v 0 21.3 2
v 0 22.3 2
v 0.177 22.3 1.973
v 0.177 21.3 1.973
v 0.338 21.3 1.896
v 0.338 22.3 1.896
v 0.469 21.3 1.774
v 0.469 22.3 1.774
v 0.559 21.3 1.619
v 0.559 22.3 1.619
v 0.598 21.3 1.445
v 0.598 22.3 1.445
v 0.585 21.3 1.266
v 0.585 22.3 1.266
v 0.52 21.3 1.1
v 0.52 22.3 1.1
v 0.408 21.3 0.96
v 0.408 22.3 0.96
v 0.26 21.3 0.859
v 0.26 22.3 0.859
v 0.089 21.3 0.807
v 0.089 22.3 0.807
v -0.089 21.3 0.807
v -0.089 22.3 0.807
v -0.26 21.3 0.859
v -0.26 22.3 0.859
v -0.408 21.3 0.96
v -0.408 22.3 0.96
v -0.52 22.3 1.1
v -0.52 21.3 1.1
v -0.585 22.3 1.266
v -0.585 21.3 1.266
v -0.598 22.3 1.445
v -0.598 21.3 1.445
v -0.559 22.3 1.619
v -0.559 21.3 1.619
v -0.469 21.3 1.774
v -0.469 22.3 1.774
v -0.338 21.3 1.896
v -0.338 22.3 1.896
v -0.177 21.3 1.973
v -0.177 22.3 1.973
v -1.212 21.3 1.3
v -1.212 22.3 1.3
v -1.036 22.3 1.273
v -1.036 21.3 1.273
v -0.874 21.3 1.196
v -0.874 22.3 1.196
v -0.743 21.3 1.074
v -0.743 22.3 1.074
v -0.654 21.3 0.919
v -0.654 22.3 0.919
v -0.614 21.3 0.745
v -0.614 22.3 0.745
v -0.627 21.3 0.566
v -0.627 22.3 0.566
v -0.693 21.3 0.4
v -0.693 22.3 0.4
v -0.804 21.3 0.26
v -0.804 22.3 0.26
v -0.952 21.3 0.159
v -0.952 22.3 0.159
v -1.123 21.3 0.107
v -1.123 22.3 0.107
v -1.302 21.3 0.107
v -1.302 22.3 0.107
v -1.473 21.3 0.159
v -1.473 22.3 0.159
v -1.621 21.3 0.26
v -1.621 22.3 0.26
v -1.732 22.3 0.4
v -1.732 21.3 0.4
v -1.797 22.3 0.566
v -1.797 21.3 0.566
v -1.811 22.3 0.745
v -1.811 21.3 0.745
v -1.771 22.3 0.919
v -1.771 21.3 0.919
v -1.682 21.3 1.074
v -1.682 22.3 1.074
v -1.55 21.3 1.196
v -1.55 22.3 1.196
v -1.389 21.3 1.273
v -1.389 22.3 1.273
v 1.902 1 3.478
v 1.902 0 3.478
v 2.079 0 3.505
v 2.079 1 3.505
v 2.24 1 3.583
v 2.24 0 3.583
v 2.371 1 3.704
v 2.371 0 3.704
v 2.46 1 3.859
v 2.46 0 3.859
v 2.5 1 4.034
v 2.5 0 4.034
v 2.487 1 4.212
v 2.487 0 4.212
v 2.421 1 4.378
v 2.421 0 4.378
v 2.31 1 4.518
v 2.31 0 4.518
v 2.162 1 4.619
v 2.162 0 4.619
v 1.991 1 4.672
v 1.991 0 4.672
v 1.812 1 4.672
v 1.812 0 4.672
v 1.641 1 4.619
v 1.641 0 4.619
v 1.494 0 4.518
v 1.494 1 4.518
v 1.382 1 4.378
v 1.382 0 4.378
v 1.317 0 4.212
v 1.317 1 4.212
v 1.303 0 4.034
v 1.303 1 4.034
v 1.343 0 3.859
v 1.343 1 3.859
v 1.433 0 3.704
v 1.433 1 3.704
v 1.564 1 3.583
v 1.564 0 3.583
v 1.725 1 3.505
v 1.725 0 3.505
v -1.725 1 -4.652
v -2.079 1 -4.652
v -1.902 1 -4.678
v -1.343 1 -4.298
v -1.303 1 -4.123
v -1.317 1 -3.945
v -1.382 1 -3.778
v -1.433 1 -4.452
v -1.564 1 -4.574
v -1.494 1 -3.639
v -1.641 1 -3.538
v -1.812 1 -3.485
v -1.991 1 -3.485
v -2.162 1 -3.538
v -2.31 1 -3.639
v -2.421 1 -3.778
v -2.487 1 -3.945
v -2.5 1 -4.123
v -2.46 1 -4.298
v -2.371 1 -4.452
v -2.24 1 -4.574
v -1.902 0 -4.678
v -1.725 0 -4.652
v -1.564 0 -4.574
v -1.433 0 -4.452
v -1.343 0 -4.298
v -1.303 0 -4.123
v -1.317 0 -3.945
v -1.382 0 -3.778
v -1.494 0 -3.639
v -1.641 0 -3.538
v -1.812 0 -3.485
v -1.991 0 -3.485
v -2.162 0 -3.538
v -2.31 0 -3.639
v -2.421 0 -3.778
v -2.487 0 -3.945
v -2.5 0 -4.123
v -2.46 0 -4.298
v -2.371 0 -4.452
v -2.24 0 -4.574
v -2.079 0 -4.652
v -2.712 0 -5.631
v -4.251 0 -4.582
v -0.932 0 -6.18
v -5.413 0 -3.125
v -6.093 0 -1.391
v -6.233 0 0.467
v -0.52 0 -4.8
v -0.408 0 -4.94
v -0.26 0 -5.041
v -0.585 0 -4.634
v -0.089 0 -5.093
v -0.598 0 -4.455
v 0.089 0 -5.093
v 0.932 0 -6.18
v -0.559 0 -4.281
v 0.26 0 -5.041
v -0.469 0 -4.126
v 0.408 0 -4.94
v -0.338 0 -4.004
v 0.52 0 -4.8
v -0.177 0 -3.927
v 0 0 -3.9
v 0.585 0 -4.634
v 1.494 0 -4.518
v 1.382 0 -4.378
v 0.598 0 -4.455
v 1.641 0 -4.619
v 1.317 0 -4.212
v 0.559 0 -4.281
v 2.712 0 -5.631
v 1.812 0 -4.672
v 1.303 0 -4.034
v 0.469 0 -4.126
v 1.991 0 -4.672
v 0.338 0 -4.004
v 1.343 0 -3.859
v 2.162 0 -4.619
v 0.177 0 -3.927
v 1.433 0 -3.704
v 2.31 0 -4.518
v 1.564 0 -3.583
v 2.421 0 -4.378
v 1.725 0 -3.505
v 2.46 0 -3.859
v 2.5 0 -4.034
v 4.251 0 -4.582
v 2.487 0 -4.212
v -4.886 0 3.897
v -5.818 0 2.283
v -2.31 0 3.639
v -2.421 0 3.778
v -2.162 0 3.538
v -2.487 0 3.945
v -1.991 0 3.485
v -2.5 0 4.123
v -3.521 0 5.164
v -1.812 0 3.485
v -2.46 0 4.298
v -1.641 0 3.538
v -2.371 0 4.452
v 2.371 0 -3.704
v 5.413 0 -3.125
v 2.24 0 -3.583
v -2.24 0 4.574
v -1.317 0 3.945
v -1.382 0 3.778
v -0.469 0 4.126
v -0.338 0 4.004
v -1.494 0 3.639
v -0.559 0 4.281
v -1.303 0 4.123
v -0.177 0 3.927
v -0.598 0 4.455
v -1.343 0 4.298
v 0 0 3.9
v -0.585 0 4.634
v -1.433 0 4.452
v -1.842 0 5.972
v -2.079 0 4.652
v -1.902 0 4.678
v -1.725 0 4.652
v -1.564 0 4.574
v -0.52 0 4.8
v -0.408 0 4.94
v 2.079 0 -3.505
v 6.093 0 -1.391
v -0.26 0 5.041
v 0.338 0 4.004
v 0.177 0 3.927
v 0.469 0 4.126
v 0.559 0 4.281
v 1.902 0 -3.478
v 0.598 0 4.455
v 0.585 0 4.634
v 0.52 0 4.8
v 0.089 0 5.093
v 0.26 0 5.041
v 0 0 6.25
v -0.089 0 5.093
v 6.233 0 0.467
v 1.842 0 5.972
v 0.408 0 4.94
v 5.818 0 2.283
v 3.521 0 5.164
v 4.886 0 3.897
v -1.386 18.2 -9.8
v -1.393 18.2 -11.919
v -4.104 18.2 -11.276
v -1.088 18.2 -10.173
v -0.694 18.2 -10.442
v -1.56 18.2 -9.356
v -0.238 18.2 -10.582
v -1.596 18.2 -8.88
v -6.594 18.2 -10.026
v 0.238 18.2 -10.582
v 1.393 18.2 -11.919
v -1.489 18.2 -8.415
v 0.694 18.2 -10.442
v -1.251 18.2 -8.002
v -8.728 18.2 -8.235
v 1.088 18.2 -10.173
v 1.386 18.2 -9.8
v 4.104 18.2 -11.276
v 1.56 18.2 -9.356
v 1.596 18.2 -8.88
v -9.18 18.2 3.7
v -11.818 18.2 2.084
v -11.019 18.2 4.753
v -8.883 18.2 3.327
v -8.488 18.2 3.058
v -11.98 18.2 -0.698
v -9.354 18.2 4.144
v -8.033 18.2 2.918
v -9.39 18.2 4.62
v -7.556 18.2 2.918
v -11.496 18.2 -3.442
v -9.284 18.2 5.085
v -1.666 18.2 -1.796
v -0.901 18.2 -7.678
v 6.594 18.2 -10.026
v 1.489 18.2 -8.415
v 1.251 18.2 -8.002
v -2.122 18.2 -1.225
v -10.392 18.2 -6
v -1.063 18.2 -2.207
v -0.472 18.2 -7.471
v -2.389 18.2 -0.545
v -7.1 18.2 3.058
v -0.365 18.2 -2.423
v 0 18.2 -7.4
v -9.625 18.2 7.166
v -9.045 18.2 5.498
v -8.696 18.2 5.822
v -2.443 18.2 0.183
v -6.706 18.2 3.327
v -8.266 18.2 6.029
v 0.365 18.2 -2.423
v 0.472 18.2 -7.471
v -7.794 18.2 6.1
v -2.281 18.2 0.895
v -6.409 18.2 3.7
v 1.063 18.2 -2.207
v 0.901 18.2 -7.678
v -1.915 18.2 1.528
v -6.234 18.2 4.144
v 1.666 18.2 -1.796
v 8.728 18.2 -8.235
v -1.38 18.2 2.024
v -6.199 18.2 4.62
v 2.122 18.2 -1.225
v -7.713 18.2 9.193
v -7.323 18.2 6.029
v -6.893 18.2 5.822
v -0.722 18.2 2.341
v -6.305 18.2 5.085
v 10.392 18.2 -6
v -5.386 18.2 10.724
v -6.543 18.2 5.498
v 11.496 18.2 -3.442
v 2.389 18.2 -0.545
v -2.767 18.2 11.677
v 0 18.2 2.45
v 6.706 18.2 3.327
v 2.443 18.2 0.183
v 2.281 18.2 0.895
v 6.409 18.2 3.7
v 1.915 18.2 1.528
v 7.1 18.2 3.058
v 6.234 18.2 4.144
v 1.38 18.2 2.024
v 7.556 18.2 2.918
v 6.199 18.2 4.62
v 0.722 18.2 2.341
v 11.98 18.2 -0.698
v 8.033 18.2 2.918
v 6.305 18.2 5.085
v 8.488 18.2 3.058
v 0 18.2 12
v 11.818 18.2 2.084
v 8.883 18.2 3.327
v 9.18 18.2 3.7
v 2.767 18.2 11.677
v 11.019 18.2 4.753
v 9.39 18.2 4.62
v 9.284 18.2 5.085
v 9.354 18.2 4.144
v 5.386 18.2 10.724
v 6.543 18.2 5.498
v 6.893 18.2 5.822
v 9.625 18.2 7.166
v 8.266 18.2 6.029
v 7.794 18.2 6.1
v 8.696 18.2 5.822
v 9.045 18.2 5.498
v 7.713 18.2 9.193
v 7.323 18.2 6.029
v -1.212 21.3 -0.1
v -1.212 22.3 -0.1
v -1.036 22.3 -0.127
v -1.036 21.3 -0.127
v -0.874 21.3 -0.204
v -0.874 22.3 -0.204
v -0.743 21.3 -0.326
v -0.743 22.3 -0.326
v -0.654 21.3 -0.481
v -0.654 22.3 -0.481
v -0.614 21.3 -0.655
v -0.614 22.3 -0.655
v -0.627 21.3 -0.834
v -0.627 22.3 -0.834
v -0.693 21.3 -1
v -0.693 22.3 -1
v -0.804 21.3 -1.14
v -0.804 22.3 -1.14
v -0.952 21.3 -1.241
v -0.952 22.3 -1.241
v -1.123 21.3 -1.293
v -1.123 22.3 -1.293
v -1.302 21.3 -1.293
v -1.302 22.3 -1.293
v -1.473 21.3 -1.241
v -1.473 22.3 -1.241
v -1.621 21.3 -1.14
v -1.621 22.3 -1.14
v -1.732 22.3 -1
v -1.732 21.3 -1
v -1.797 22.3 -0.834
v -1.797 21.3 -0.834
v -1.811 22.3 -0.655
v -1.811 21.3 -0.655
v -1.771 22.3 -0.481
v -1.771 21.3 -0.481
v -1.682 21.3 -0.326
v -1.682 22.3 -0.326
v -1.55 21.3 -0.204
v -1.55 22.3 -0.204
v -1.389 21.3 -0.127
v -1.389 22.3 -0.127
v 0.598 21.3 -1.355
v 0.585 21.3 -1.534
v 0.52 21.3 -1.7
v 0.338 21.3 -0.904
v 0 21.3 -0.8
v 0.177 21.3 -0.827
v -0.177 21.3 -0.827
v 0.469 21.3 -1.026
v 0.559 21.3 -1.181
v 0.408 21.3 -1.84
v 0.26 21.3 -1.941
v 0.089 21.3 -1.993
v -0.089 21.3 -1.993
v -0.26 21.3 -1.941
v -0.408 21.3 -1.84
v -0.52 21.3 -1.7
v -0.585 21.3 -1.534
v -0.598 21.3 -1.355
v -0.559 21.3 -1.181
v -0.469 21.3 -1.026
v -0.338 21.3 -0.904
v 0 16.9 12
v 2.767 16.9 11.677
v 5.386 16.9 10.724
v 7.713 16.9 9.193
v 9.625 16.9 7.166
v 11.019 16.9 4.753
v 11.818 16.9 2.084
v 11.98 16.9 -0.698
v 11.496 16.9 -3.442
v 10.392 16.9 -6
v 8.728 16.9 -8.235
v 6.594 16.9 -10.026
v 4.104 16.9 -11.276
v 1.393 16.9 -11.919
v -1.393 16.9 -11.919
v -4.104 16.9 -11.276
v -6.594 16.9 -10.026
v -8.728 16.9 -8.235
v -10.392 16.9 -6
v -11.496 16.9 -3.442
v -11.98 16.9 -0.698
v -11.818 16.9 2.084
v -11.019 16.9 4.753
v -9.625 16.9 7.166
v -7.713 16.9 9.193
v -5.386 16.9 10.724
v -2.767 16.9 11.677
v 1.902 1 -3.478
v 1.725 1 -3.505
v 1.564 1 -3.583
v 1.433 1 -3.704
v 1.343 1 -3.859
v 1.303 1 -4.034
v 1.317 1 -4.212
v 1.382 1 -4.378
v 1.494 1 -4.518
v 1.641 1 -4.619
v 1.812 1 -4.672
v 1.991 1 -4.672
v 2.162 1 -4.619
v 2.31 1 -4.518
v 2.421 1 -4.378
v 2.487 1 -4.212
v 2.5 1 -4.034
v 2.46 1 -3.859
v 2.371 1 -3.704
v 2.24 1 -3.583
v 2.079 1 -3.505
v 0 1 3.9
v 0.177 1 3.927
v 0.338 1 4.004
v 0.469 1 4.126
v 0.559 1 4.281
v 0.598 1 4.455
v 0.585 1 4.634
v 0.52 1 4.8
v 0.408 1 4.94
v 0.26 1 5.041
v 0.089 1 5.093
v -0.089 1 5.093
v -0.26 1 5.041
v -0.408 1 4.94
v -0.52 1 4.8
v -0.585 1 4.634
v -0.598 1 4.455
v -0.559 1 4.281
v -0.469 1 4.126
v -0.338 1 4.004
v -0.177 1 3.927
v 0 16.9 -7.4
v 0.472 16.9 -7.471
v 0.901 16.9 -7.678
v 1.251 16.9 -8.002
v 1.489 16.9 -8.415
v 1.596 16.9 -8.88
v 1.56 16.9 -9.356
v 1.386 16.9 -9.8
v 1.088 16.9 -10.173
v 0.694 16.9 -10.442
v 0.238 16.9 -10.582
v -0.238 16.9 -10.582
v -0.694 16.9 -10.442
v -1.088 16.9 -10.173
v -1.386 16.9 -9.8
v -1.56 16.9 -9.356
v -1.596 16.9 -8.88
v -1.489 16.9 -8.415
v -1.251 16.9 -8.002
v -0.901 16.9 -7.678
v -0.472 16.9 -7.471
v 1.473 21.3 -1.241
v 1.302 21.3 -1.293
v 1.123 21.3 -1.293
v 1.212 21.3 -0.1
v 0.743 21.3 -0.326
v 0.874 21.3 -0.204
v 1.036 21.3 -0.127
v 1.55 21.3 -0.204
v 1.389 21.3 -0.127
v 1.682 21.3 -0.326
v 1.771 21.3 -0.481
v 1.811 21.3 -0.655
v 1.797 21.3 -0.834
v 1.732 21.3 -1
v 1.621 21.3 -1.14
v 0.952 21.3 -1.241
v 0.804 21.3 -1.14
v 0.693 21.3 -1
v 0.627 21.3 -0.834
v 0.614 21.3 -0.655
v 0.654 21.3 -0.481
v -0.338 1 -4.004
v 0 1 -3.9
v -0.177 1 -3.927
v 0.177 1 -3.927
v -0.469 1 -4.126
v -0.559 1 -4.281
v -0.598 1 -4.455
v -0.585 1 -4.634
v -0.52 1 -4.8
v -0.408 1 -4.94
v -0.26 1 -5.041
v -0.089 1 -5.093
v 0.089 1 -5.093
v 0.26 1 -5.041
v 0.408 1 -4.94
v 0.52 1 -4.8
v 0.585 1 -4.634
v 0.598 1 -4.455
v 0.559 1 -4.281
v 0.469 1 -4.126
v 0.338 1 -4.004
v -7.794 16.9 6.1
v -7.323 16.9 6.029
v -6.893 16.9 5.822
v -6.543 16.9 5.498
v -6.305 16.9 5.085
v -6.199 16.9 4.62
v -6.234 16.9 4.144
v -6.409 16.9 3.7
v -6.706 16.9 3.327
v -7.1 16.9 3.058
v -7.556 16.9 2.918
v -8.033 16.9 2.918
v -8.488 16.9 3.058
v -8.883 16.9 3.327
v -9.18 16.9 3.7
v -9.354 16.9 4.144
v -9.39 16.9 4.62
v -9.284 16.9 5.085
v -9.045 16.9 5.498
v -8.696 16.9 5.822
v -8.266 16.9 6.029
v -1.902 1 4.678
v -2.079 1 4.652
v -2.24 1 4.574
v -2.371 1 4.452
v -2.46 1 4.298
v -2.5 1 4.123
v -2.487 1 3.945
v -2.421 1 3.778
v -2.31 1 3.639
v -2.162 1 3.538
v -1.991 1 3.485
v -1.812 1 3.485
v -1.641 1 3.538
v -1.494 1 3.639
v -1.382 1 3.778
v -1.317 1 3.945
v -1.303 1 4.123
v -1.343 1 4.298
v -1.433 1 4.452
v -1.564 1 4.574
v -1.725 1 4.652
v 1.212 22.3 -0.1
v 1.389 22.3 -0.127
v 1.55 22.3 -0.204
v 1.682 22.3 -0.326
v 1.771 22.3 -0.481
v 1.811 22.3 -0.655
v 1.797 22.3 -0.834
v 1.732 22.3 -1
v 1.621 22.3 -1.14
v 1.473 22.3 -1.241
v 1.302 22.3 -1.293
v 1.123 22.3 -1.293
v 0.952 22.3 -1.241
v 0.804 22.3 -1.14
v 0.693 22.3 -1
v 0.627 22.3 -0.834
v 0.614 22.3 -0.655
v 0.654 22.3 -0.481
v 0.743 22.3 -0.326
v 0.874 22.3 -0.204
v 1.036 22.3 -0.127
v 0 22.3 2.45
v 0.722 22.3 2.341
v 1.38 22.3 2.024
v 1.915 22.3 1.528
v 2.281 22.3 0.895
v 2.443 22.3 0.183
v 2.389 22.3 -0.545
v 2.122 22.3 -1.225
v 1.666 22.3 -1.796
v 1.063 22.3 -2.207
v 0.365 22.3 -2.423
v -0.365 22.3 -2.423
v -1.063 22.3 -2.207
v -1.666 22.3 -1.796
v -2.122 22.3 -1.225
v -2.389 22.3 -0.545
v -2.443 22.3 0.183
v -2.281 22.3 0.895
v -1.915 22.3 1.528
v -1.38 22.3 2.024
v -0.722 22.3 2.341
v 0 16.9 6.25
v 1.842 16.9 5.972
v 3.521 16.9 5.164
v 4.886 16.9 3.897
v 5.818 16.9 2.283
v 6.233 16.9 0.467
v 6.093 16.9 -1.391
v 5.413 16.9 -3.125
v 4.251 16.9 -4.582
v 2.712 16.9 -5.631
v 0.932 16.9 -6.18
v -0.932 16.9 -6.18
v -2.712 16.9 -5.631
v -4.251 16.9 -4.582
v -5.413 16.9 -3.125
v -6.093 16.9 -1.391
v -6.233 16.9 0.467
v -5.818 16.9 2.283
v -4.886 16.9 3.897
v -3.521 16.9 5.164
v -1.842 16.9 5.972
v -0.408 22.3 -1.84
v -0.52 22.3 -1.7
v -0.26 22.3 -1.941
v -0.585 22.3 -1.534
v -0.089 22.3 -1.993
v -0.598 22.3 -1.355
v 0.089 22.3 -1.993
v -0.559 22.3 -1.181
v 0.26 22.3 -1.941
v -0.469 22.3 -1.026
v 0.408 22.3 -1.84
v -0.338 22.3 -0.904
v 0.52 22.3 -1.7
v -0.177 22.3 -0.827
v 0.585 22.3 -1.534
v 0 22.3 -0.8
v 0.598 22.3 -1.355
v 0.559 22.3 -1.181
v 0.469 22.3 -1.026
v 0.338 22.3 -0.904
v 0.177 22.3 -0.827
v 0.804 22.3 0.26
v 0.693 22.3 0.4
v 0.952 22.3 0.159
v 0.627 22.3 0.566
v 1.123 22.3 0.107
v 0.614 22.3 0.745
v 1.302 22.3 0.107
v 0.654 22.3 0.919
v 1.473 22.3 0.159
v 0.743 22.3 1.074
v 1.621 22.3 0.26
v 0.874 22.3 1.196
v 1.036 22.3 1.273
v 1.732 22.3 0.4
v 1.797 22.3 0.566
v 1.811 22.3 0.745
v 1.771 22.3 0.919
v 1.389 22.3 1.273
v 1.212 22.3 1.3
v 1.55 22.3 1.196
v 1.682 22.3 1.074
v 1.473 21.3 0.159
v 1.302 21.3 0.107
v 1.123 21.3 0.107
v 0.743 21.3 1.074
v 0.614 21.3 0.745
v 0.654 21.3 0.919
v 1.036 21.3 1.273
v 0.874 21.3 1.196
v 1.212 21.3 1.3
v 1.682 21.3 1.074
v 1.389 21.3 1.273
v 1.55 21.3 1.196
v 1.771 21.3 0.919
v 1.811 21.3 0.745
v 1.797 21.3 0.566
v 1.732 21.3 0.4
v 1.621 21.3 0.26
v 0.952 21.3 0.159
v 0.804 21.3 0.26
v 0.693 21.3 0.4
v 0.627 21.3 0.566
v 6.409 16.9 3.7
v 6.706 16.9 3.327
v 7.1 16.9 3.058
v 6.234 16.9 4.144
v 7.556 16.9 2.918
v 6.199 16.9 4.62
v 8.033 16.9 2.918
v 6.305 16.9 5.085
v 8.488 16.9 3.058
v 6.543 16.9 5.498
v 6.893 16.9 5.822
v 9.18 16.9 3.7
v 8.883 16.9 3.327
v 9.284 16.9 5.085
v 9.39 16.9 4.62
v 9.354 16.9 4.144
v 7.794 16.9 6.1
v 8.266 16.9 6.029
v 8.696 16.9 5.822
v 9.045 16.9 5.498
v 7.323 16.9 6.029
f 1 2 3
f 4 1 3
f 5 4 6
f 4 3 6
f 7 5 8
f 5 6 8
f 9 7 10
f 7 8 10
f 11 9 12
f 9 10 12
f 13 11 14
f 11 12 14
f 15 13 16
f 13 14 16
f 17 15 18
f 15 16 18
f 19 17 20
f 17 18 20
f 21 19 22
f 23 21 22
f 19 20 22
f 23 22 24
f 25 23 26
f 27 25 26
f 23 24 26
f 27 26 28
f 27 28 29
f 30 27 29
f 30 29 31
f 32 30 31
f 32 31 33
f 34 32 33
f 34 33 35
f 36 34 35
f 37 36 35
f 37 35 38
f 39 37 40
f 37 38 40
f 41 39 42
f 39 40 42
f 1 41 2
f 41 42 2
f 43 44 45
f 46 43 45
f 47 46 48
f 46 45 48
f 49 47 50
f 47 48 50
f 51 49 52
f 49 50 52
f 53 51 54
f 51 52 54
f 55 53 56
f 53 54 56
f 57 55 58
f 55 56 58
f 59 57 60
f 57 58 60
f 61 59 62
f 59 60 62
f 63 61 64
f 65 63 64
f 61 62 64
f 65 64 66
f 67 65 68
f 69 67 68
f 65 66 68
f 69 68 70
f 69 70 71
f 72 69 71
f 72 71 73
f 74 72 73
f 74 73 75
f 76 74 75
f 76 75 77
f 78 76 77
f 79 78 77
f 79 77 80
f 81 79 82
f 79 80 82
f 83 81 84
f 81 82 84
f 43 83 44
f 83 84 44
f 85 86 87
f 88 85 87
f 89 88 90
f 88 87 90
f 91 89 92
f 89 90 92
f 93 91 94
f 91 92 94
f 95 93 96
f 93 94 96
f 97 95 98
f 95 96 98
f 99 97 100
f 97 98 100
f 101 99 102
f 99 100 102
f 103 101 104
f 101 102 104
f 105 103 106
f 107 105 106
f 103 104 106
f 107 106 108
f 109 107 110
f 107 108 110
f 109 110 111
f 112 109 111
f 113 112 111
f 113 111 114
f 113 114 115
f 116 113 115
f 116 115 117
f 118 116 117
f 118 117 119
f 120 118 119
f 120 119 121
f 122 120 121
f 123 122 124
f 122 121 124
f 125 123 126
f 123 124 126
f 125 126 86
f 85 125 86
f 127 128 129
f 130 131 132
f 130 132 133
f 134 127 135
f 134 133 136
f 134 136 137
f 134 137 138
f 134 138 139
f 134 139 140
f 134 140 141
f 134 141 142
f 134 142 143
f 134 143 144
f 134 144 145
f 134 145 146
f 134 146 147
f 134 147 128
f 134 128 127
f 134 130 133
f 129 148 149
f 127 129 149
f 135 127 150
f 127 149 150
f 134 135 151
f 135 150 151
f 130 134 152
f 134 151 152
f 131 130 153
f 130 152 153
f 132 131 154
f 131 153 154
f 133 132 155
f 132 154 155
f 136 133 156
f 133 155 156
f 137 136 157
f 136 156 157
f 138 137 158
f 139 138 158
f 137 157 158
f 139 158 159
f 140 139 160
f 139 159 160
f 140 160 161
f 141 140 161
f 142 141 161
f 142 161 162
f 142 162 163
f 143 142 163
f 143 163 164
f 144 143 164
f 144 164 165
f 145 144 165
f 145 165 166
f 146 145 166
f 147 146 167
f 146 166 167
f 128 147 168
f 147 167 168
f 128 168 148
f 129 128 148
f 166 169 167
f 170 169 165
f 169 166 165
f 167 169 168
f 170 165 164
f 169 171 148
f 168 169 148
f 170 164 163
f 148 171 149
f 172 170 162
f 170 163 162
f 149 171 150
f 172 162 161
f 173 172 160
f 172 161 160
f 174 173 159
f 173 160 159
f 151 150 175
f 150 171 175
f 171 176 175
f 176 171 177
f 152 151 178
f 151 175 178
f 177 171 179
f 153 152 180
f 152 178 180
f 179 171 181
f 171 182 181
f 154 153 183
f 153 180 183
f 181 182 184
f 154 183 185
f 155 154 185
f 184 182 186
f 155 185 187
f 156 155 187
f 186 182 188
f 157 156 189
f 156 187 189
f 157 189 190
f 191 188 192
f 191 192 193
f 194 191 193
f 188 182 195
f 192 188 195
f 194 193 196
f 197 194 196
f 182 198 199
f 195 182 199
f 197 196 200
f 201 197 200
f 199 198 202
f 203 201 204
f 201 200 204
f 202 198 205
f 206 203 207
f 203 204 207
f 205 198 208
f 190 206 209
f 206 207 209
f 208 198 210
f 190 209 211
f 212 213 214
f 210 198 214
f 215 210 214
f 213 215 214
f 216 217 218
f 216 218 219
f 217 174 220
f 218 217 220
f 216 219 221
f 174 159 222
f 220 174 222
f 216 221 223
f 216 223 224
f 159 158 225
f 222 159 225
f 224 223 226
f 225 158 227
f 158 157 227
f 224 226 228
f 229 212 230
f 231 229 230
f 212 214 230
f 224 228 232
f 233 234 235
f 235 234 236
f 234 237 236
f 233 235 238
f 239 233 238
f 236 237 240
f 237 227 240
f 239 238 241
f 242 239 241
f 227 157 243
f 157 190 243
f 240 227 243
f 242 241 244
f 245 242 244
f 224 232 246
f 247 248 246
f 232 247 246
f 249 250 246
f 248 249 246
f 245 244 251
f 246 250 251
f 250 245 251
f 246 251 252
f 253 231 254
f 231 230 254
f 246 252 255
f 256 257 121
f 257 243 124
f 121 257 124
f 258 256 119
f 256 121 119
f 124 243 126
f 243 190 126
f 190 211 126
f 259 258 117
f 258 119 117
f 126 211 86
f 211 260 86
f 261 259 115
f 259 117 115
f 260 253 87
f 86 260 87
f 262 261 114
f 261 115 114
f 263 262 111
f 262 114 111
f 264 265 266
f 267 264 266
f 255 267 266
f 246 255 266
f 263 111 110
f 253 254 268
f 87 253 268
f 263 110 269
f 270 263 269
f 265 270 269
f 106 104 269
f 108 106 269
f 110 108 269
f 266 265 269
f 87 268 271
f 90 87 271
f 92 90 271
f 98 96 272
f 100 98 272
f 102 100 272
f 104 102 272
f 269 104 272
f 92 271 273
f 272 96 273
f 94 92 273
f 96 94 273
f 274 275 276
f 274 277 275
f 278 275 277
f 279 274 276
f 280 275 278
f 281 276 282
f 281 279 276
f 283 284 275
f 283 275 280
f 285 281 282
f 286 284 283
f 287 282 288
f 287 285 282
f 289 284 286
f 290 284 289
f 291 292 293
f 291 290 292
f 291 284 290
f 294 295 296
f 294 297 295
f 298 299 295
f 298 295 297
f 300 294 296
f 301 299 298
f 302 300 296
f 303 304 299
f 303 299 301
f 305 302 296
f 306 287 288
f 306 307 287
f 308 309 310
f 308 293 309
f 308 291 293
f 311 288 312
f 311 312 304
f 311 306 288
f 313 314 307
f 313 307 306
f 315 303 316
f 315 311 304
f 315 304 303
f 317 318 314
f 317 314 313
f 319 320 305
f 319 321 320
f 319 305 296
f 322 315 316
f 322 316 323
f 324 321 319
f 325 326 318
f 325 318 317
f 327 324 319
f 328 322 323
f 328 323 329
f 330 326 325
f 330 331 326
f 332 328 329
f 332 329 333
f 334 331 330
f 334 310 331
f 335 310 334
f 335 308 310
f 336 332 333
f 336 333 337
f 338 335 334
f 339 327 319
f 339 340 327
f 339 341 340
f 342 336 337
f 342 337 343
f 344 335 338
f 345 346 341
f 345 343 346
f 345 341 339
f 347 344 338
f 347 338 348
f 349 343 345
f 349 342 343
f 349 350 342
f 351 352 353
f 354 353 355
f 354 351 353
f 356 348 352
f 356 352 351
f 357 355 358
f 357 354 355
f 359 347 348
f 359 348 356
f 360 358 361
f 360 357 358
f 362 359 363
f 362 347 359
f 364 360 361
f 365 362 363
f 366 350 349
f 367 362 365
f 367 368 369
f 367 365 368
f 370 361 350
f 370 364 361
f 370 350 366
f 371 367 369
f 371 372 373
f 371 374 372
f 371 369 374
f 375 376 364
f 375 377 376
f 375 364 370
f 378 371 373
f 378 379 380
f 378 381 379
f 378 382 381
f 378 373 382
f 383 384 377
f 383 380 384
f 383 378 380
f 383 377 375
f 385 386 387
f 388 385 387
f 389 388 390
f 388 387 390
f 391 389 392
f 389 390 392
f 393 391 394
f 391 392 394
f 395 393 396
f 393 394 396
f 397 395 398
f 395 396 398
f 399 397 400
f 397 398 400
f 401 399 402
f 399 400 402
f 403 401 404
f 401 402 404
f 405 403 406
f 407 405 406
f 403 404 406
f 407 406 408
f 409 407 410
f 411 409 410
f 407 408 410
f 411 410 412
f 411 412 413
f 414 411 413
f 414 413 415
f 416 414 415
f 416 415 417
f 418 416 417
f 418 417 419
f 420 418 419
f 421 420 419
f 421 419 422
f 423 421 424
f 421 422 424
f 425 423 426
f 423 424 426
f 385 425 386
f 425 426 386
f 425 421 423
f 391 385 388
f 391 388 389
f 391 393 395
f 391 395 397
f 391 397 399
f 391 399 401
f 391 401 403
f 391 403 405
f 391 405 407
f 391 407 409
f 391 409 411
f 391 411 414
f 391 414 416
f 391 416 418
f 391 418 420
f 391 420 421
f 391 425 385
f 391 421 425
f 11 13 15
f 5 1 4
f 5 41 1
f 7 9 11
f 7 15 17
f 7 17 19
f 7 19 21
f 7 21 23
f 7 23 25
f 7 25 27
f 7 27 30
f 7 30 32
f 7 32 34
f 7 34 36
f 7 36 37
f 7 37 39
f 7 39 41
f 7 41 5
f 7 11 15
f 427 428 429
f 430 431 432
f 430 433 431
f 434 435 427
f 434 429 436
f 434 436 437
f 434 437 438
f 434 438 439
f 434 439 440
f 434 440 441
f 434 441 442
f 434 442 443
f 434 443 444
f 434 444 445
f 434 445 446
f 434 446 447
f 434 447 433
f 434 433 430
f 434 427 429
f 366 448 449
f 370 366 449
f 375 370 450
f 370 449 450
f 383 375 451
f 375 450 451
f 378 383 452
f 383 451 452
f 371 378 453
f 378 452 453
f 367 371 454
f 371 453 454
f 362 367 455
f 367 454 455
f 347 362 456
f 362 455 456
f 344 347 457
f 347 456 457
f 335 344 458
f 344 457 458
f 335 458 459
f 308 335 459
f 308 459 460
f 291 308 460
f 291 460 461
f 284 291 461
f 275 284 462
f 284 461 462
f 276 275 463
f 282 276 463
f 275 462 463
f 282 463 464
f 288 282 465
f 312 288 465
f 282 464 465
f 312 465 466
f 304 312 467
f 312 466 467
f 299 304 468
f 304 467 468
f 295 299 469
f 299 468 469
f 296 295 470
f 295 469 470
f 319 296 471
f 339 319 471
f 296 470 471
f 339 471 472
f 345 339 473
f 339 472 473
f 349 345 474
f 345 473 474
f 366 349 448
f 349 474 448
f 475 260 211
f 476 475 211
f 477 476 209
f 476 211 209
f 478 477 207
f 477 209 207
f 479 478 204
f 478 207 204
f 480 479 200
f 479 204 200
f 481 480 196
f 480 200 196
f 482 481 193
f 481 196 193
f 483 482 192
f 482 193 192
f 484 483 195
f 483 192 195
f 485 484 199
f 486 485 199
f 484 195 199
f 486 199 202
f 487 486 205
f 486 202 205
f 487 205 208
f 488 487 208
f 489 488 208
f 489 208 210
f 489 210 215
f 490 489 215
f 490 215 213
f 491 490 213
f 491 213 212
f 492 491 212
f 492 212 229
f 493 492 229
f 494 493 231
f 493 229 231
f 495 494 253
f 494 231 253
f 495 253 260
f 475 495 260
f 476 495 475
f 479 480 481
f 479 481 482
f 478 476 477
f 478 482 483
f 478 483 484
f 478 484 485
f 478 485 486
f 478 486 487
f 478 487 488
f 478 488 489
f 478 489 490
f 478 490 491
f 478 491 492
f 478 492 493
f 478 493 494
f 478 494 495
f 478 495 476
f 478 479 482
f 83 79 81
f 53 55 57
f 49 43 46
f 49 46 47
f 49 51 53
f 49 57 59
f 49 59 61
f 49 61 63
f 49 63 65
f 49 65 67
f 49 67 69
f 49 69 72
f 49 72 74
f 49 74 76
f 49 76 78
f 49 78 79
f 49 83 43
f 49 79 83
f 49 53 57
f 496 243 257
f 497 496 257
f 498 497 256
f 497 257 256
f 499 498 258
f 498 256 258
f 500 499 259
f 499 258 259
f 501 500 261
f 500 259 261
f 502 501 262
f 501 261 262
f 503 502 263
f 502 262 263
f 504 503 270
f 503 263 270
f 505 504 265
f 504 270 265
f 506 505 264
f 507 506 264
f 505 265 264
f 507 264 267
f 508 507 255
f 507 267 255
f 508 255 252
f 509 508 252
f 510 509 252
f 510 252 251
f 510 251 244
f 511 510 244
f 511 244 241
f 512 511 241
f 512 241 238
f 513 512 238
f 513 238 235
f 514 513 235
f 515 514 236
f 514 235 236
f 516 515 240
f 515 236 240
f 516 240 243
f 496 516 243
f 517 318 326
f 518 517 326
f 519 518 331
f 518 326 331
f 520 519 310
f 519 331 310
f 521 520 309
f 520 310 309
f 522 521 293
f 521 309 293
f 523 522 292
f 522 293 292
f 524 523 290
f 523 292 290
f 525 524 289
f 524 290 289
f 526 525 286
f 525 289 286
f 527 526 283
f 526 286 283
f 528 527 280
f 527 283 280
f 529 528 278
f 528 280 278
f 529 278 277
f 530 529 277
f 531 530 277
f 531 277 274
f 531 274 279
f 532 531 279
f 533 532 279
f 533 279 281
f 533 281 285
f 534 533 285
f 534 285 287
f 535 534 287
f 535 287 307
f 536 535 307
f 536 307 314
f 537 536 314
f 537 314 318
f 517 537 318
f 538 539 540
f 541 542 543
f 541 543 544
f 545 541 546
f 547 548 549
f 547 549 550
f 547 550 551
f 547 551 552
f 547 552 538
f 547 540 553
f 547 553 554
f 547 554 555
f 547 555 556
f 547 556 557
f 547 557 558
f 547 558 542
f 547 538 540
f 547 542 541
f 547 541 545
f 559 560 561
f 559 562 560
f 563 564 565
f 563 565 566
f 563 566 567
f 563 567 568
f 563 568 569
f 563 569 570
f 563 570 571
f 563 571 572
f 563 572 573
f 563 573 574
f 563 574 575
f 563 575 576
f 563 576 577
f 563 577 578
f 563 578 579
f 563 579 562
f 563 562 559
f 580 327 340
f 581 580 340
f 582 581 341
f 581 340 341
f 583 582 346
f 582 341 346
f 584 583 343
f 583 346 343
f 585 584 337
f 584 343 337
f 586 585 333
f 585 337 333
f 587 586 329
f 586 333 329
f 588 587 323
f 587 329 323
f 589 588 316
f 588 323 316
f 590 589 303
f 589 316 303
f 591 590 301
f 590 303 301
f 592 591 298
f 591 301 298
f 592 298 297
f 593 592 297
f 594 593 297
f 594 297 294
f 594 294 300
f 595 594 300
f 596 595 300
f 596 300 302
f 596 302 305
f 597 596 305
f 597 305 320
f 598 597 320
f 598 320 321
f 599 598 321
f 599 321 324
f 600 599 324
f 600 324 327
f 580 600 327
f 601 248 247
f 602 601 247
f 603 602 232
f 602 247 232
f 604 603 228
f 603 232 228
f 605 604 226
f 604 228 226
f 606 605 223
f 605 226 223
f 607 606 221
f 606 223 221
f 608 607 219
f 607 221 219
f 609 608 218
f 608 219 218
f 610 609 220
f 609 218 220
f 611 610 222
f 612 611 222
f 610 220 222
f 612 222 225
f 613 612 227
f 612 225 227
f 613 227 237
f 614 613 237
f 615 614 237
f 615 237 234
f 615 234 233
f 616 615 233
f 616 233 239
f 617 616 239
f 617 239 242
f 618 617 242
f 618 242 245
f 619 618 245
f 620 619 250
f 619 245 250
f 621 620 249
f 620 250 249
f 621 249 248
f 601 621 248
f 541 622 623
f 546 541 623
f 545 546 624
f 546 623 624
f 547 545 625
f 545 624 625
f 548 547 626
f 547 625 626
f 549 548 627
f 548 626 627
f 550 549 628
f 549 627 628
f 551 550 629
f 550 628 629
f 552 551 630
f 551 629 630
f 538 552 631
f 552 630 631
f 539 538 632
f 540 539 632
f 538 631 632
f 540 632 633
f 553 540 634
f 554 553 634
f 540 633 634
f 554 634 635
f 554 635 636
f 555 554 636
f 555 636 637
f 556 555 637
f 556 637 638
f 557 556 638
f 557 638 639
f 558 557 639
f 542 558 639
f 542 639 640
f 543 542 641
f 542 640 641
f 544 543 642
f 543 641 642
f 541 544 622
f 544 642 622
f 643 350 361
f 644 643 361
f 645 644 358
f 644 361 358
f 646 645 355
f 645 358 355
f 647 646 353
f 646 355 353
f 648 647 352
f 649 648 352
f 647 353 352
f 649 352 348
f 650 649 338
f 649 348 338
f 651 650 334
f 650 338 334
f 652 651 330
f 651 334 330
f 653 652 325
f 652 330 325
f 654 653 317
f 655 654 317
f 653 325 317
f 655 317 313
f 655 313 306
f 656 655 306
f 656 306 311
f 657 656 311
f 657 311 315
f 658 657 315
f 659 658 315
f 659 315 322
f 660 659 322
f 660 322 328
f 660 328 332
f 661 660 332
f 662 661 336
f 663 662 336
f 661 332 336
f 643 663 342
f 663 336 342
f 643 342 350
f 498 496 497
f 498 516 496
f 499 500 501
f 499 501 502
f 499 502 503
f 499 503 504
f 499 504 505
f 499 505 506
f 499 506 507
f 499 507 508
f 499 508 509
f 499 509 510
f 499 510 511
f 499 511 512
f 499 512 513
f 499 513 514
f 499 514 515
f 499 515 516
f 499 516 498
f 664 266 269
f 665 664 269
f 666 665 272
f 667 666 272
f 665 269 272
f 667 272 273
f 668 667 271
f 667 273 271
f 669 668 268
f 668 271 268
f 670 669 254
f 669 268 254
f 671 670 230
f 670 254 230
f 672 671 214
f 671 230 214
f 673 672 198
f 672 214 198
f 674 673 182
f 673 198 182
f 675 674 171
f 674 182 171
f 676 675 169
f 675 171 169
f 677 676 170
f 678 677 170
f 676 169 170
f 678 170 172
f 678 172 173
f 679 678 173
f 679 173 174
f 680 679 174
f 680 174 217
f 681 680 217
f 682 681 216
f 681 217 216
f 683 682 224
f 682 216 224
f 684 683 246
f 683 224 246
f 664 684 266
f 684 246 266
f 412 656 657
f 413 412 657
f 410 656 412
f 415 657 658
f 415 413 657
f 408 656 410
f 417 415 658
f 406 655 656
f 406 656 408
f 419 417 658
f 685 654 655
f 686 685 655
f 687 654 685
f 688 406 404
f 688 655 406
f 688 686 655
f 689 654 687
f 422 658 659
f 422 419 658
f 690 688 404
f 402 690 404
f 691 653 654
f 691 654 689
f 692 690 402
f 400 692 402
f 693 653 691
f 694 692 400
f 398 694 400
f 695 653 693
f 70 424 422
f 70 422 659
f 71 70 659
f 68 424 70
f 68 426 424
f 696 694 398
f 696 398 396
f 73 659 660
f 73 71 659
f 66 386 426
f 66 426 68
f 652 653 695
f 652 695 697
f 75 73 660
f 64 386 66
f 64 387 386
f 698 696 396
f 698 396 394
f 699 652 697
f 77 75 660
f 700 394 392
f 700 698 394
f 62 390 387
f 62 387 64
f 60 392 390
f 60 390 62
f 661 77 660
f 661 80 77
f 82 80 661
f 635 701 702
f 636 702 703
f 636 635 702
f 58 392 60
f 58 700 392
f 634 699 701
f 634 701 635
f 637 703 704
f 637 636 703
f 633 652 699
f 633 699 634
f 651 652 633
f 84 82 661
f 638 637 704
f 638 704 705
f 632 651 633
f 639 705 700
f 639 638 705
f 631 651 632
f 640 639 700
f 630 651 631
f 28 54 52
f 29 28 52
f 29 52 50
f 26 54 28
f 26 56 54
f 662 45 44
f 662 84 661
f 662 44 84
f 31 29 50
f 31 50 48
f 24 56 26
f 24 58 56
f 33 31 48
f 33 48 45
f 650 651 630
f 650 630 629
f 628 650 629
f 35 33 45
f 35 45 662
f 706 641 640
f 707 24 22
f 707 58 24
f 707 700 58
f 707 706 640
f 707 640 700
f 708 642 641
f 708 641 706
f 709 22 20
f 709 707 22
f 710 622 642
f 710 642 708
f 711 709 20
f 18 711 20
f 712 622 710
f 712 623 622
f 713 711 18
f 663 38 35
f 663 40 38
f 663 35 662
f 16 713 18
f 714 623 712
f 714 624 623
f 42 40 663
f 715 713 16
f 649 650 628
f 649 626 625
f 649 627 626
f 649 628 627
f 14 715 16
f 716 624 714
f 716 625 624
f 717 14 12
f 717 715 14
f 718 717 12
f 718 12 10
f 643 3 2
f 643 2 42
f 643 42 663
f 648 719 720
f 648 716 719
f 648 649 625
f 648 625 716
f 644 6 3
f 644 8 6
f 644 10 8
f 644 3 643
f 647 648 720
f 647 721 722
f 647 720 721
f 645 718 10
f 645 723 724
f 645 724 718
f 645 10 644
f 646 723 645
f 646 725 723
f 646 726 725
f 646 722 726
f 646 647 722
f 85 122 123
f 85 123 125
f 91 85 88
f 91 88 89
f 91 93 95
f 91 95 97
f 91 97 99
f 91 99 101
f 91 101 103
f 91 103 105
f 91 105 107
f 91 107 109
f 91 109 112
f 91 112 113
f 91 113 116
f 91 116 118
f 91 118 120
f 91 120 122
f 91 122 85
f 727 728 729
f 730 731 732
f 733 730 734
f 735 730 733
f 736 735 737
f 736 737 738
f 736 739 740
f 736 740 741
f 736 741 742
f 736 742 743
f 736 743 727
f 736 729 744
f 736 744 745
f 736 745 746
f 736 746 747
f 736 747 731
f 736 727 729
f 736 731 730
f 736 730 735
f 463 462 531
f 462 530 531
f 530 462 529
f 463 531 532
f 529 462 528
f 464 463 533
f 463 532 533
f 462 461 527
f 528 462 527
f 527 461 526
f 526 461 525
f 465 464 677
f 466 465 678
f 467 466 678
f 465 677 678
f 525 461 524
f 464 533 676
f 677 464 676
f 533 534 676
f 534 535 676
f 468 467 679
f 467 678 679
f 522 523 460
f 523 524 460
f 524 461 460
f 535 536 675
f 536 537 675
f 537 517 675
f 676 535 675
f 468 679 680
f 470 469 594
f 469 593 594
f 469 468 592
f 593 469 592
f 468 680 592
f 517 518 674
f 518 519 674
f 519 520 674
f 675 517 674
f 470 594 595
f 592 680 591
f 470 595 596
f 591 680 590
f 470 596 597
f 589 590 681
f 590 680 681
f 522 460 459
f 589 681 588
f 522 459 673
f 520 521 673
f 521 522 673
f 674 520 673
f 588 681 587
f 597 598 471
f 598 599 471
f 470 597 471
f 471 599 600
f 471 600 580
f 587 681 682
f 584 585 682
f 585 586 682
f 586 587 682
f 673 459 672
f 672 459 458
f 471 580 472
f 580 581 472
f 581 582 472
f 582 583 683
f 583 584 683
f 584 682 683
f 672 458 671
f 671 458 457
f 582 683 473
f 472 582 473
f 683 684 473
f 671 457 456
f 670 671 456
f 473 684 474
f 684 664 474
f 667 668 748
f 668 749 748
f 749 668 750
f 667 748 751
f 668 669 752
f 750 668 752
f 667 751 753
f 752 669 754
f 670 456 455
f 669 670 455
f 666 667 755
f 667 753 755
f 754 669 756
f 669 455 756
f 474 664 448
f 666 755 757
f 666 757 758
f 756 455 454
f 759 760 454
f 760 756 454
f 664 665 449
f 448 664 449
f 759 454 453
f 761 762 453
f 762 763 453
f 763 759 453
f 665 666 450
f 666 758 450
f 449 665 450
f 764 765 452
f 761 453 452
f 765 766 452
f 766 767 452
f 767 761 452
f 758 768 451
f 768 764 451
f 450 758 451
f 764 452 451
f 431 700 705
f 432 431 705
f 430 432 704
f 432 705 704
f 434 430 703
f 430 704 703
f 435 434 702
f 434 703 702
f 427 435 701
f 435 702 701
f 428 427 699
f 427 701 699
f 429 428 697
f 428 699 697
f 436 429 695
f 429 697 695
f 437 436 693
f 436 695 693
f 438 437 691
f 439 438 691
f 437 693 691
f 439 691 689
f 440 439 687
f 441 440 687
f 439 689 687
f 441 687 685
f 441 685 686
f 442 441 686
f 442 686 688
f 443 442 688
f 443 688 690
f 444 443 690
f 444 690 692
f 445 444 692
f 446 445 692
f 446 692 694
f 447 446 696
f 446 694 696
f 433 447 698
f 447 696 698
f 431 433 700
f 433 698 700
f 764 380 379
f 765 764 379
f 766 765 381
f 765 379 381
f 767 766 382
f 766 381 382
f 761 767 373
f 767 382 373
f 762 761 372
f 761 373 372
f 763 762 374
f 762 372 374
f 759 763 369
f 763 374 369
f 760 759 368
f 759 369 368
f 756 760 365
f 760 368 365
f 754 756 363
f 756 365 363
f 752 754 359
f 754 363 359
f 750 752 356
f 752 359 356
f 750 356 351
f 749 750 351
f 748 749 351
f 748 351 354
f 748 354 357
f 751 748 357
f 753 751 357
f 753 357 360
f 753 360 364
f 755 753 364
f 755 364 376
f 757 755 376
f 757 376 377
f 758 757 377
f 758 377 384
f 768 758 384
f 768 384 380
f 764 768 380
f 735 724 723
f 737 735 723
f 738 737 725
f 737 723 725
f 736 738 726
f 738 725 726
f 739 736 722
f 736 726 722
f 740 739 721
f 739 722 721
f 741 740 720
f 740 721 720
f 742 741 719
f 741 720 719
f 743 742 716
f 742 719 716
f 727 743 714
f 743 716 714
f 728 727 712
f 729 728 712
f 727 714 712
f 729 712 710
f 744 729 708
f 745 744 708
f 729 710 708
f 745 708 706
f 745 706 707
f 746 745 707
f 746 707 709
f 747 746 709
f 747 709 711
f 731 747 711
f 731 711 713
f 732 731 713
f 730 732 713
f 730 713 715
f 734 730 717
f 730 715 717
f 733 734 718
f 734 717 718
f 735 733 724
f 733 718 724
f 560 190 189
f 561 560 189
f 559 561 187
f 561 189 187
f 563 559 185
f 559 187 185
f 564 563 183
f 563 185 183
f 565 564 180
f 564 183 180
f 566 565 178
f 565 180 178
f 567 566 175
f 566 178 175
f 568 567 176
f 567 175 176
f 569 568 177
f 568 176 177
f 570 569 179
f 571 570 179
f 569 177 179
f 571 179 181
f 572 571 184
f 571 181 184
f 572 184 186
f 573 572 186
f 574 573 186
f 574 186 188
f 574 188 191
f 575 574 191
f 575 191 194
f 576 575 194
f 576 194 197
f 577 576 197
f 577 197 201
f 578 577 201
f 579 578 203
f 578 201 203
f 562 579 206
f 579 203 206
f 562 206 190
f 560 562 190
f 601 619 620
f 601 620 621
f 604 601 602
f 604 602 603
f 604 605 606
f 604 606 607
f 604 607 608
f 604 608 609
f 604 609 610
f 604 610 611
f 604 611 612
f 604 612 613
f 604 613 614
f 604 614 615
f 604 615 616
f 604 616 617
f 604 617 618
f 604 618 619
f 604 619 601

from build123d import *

# Parameters (mm, degrees)
ESBO_O1_R                = 6.25
RESSALTO_EXTRUS_O1_DEPTH = 16.9
ESBO_O2_R                = 12
RESSALTO_EXTRUS_O2_DEPTH = 1.3
ESBO_O3_R                = 1.6
CORTE_EXTRUS_O1_DEPTH    = 25.884533349
ESBO_O4_R                = 2.45
RESSALTO_EXTRUS_O3_DEPTH = 4.1
ESBO_O5_R                = 0.6
CORTE_EXTRUS_O2_DEPTH    = 1
ESBO_O7_R                = 0.6
CORTE_EXTRUS_O3_DEPTH    = 1


with BuildPart() as part:
    # Esboço1 → Ressalto-extrusão1 (new body)
    with BuildSketch(Plane(origin=(0, 0, 0), x_dir=(1, 0, 0), z_dir=(0, 1, 0))):
        with Locations(Location((0, 0, 0), (0, 0, 270))):
            Circle(ESBO_O1_R)
    extrude(amount=RESSALTO_EXTRUS_O1_DEPTH)

    # Esboço2 → Ressalto-extrusão2 (add)
    with BuildSketch(Plane(origin=(0, 16.9, 0), x_dir=(1, 0, 0), z_dir=(0, 1, 0))):
        with Locations(Location((0, 0, 0), (0, 0, 270))):
            Circle(ESBO_O2_R)
    extrude(amount=RESSALTO_EXTRUS_O2_DEPTH)

    # Esboço3 → Corte-extrusão1 (cut, through all)
    with BuildSketch(Plane(origin=(0, 18.2, 0), x_dir=(1, 0, 0), z_dir=(0, 1, 0))):
        with Locations(Location((0, 9, 0), (0, 0, 270))):
            Circle(ESBO_O3_R)
        with Locations(Location((7.794228634, -4.5, 0), (0, 0, 270))):
            Circle(ESBO_O3_R)
        with Locations(Location((-7.794228634, -4.5, 0), (0, 0, 270))):
            Circle(ESBO_O3_R)
    extrude(amount=-CORTE_EXTRUS_O1_DEPTH, mode=Mode.SUBTRACT)

    # Esboço4 → Ressalto-extrusão3 (add)
    with BuildSketch(Plane(origin=(0, 18.2, 0), x_dir=(1, 0, 0), z_dir=(0, 1, 0))):
        with Locations(Location((0, 0, 0), (0, 0, 270))):
            Circle(ESBO_O4_R)
    extrude(amount=RESSALTO_EXTRUS_O3_DEPTH)

    # Esboço5 → Corte-extrusão2 (cut)
    with BuildSketch(Plane(origin=(0, 22.3, 0), x_dir=(1, 0, 0), z_dir=(0, 1, 0))):
        with Locations(Location((0, 1.4, 0), (0, 0, 270))):
            Circle(ESBO_O5_R)
        with Locations(Location((1.212435565, 0.7, 0), (0, 0, 270))):
            Circle(ESBO_O5_R)
        with Locations(Location((1.212435565, -0.7, 0), (0, 0, 270))):
            Circle(ESBO_O5_R)
        with Locations(Location((0, -1.4, 0), (0, 0, 270))):
            Circle(ESBO_O5_R)
        with Locations(Location((-1.212435565, -0.7, 0), (0, 0, 270))):
            Circle(ESBO_O5_R)
        with Locations(Location((-1.212435565, 0.7, 0), (0, 0, 270))):
            Circle(ESBO_O5_R)
    extrude(amount=-CORTE_EXTRUS_O2_DEPTH, mode=Mode.SUBTRACT)

    # Esboço7 → Corte-extrusão3 (cut)
    with BuildSketch(Plane.XZ):
        with Locations(Location((0, 4.5, 0), (0, 0, 270))):
            Circle(ESBO_O7_R)
        with Locations(Location((1.901782178, 4.078385042, 0), (0, 0, 270))):
            Circle(ESBO_O7_R)
        with Locations(Location((-1.901782178, 4.078385042, 0), (0, 0, 90))):
            Circle(ESBO_O7_R)
        with Locations(Location((-1.901782178, -4.078385042, 0), (0, 0, 270))):
            Circle(ESBO_O7_R)
        with Locations(Location((1.901782178, -4.078385042, 0), (0, 0, 90))):
            Circle(ESBO_O7_R)
        with Locations(Location((0, -4.5, 0), (0, 0, 90))):
            Circle(ESBO_O7_R)
    extrude(amount=-CORTE_EXTRUS_O3_DEPTH, mode=Mode.SUBTRACT)


solid = part.part
